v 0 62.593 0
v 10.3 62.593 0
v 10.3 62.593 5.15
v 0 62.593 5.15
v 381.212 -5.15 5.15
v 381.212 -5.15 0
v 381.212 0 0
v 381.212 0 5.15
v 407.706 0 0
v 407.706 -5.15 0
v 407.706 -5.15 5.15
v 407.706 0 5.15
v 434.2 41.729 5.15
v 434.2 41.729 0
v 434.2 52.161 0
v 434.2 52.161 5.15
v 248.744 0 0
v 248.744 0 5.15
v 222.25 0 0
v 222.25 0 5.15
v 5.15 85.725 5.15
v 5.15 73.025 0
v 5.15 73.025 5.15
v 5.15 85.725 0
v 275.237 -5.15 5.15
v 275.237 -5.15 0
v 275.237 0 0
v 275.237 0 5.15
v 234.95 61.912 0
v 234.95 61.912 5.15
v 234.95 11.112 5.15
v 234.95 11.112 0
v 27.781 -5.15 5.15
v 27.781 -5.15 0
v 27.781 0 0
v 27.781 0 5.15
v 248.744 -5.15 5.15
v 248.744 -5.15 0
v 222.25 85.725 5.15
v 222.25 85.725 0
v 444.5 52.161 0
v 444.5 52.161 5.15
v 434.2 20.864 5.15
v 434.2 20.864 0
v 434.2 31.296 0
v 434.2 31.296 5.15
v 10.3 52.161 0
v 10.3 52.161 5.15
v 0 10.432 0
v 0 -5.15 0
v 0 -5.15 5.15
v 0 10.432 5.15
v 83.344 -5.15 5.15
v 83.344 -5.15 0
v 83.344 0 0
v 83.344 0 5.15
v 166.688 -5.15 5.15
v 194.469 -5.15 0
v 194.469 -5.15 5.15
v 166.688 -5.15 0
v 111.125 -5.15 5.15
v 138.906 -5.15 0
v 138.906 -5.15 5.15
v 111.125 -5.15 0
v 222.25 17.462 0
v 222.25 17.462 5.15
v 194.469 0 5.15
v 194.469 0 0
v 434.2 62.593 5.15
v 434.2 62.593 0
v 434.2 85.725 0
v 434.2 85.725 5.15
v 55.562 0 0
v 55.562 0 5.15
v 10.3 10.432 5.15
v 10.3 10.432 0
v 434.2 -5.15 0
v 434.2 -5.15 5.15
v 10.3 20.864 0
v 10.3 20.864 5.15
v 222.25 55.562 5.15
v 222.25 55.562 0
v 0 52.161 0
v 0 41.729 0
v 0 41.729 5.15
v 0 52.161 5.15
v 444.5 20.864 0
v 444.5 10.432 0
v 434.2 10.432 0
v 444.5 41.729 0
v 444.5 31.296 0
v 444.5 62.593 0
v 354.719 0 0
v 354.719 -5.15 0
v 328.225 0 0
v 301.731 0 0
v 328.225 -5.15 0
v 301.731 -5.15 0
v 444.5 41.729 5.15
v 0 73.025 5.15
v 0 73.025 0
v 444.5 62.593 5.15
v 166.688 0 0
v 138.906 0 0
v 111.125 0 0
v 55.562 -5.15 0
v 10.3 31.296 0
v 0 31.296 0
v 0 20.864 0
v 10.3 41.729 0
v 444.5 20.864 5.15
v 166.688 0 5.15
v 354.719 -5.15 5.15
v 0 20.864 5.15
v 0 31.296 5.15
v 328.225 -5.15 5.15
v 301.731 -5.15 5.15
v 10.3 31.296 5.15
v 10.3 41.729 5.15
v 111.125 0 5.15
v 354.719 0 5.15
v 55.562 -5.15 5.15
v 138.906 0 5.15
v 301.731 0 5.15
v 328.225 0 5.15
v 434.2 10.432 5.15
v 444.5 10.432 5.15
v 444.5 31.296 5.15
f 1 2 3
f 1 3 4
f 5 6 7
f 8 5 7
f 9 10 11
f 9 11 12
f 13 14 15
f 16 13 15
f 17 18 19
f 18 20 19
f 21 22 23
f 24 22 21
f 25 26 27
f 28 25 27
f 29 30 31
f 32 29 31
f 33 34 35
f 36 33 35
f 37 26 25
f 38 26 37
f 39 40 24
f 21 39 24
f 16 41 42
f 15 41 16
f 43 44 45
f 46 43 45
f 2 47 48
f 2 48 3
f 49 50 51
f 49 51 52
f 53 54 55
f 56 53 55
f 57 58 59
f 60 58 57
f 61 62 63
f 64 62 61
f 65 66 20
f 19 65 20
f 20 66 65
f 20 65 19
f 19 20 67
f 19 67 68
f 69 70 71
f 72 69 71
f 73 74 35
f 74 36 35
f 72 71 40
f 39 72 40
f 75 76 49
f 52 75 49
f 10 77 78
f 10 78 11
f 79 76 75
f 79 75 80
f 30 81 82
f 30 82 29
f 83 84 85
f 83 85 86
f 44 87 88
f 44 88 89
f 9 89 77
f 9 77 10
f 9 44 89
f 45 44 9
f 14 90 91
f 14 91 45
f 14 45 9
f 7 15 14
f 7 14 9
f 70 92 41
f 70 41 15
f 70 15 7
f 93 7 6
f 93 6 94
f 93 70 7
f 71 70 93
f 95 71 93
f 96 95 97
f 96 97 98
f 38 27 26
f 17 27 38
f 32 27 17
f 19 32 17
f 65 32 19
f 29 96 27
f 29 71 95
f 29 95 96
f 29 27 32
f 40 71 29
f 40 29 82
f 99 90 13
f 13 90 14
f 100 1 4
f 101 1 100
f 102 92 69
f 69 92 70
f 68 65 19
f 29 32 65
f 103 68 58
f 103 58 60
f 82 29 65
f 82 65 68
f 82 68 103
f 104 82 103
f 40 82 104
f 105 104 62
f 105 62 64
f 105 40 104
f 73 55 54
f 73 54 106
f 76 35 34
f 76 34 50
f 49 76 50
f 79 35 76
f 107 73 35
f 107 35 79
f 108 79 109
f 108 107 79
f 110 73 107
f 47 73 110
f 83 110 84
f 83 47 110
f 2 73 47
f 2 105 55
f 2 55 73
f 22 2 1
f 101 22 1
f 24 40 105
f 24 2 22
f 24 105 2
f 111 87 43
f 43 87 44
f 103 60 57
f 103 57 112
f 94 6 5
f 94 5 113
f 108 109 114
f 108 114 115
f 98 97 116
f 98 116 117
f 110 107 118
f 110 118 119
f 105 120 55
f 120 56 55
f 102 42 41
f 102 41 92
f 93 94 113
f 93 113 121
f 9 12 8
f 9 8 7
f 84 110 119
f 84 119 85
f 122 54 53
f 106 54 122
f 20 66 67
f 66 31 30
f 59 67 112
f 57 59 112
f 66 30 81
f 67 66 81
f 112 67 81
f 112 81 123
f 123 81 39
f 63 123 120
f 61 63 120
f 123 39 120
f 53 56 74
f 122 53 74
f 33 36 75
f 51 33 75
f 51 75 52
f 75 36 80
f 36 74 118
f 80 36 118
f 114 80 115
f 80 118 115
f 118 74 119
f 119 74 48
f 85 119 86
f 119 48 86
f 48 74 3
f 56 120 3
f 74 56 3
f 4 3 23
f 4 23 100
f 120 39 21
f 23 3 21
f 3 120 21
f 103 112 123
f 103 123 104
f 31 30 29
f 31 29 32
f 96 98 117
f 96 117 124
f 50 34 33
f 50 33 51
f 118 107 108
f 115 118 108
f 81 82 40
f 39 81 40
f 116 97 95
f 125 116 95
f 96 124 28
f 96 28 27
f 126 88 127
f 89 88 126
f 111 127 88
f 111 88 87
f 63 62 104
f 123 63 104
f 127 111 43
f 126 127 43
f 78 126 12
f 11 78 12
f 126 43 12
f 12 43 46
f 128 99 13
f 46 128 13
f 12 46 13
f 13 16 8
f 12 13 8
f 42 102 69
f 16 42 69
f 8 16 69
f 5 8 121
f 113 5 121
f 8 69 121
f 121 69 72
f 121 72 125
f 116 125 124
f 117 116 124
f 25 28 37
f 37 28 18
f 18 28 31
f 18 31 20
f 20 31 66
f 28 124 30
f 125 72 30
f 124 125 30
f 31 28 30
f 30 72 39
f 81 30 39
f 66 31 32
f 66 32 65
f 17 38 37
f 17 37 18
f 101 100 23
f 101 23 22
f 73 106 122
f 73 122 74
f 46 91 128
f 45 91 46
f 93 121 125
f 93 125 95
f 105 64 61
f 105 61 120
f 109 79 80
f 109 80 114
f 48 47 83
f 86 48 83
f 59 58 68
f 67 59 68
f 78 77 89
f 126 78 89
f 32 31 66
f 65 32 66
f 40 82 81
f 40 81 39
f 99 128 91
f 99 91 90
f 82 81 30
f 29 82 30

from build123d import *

# Parameters (mm, degrees)
SKETCH1_W              = 444.5
SKETCH1_H              = 73.025
BOSS_EXTRUDE1_DEPTH    = 5.15
SKETCH3_W              = 3.175
SKETCH3_H              = 73.025
BOSS_EXTRUDE2_DEPTH    = 441.325
SKETCH4_W              = 3.175
SKETCH4_H              = 73.025
BOSS_EXTRUDE3_DEPTH    = 438.15
SPLIT2_SURFACE_1_BACK  = 635.234
SPLIT2_SURFACE_1_DEPTH = 1270.468
SPLIT2_SURFACE_2_BACK  = 635.234
SPLIT2_SURFACE_2_DEPTH = 1270.468
SKETCH8_W              = 441.325
SKETCH8_H              = 73.025
CUT_EXTRUDE2_DEPTH     = 631.619264097
SKETCH9_W              = 10.300000228
SKETCH9_H              = 10.432142857
SKETCH9_H_2            = 10.432142858
CUT_EXTRUDE3_DEPTH     = 451.48798333
SKETCH15_W             = 26.493749972
SKETCH15_H             = 5.15
BOSS_EXTRUDE6_DEPTH    = 5.15
SKETCH16_W             = 27.78125
SKETCH16_H             = 5.15
BOSS_EXTRUDE7_DEPTH    = 5.15
SKETCH17_W             = 211.949999772
SKETCH17_H             = 12.7
BOSS_EXTRUDE8_DEPTH    = 5.15
SKETCH18_W             = 217.099999886
SKETCH18_H             = 12.7
BOSS_EXTRUDE9_DEPTH    = 5.15


with BuildPart() as part:
    # Sketch1 → Boss-Extrude1 (new body)
    with BuildSketch(Plane.XY):
        with Locations((222.25, 36.5125)):
            Rectangle(SKETCH1_W, SKETCH1_H)
    extrude(amount=BOSS_EXTRUDE1_DEPTH)

    # Sketch3 → Boss-Extrude2 (add)
    with BuildSketch(Plane(origin=(0, 0, 0), x_dir=(-1, 0, 0), z_dir=(0, 0, -1))):
        with Locations((-442.9125, 36.5125)):
            Rectangle(SKETCH3_W, SKETCH3_H)
        with Locations((-1.5875, 36.5125)):
            Rectangle(SKETCH3_W, SKETCH3_H)
    extrude(amount=BOSS_EXTRUDE2_DEPTH)

    # Sketch4 → Boss-Extrude3 (add)
    with BuildSketch(Plane(origin=(3.175, 0, 0), x_dir=(0, 0, -1), z_dir=(1, 0, 0))):
        with Locations((439.7375, 36.5125)):
            Rectangle(SKETCH4_W, SKETCH4_H)
    extrude(amount=BOSS_EXTRUDE3_DEPTH)


with BuildPart() as body_2:
    # Split2: the piece behind the surface
    add(part.part)
    # Split2 surface: a surface, the sketch's curves swept straight by 1270.468 mm
    with BuildLine(Plane(origin=(0, 0, 5.15), x_dir=(-1, 0, 0), z_dir=(0, 0, -1)).offset(-SPLIT2_SURFACE_1_BACK), mode=Mode.PRIVATE) as split2_surface_1_path:
        Line((-222.25, 73.025), (-222.25, 55.5625))
        Line((-222.25, 55.5625), (-234.95, 61.9125))
        Line((-234.95, 61.9125), (-234.95, 11.1125))
        Line((-234.95, 11.1125), (-222.25, 17.4625))
        Line((-222.25, 17.4625), (-222.25, 0))
    split2_surface_1 = Shell.extrude(split2_surface_1_path.wire(), (0 * SPLIT2_SURFACE_1_DEPTH, 0 * SPLIT2_SURFACE_1_DEPTH, -1 * SPLIT2_SURFACE_1_DEPTH))
    split(bisect_by=split2_surface_1, keep=Keep.BOTTOM)


with BuildPart() as part_1:
    add(part.part)

    # Split2: split by a surface, the side it looks to stays
    # Split2 surface: a surface, the sketch's curves swept straight by 1270.468 mm
    with BuildLine(Plane(origin=(0, 0, 5.15), x_dir=(-1, 0, 0), z_dir=(0, 0, -1)).offset(-SPLIT2_SURFACE_2_BACK), mode=Mode.PRIVATE) as split2_surface_2_path:
        Line((-222.25, 73.025), (-222.25, 55.5625))
        Line((-222.25, 55.5625), (-234.95, 61.9125))
        Line((-234.95, 61.9125), (-234.95, 11.1125))
        Line((-234.95, 11.1125), (-222.25, 17.4625))
        Line((-222.25, 17.4625), (-222.25, 0))
    split2_surface_2 = Shell.extrude(split2_surface_2_path.wire(), (0 * SPLIT2_SURFACE_2_DEPTH, 0 * SPLIT2_SURFACE_2_DEPTH, -1 * SPLIT2_SURFACE_2_DEPTH))
    split(bisect_by=split2_surface_2, keep=Keep.TOP)


with BuildPart() as cut_extrude2_tool:
    # Sketch8 → Cut-Extrude2 (new, through all)
    with BuildSketch(Plane(origin=(444.5, 0, 0), x_dir=(0, 0, -1), z_dir=(1, 0, 0))):
        with Locations((220.6625, 36.5125)):
            Rectangle(SKETCH8_W, SKETCH8_H)
    extrude(amount=-CUT_EXTRUDE2_DEPTH)


with BuildPart() as part_2:
    add(part_1.part)

    # Cut-Extrude2: cut by cut_extrude2_tool
    add(cut_extrude2_tool.part, mode=Mode.SUBTRACT)


with BuildPart() as body_2_1:
    add(body_2.part)

    # Cut-Extrude2: cut by cut_extrude2_tool
    add(cut_extrude2_tool.part, mode=Mode.SUBTRACT)


with BuildPart() as cut_extrude3_tool:
    # Sketch9 → Cut-Extrude3 (new, through all)
    with BuildSketch(Plane(origin=(0, 0, 0), x_dir=(-1, 0, 0), z_dir=(0, 0, -1))):
        with Locations((-439.349999886, 67.808928572)):
            Rectangle(SKETCH9_W, SKETCH9_H)
        with Locations((-439.349999886, 46.944642857)):
            Rectangle(SKETCH9_W, SKETCH9_H)
        with Locations((-439.349999886, 26.080357143)):
            Rectangle(SKETCH9_W, SKETCH9_H)
        with Locations((-439.349999886, 5.216071429)):
            Rectangle(SKETCH9_W, SKETCH9_H)
        with Locations((-5.150000114, 57.376785715)):
            Rectangle(SKETCH9_W, SKETCH9_H)
        with Locations((-5.150000114, 36.5125)):
            Rectangle(SKETCH9_W, SKETCH9_H_2)
        with Locations((-5.150000114, 15.648214285)):
            Rectangle(SKETCH9_W, SKETCH9_H)
    extrude(amount=-CUT_EXTRUDE3_DEPTH)


with BuildPart() as part_3:
    add(part_2.part)

    # Cut-Extrude3: cut by cut_extrude3_tool
    add(cut_extrude3_tool.part, mode=Mode.SUBTRACT)

    # Sketch16 → Boss-Extrude7 (add)
    with BuildSketch(Plane(origin=(0, 0, 0), x_dir=(-1, 0, 0), z_dir=(0, 0, -1))):
        with Locations((-13.890625, -2.575)):
            Rectangle(SKETCH16_W, SKETCH16_H)
        with Locations((-69.453125, -2.575)):
            Rectangle(SKETCH16_W, SKETCH16_H)
        with Locations((-125.015625, -2.575)):
            Rectangle(SKETCH16_W, SKETCH16_H)
        with Locations((-180.578125, -2.575)):
            Rectangle(SKETCH16_W, SKETCH16_H)
    extrude(amount=-BOSS_EXTRUDE7_DEPTH)

    # Sketch18 → Boss-Extrude9 (add)
    with BuildSketch(Plane(origin=(0, 0, 0), x_dir=(-1, 0, 0), z_dir=(0, 0, -1))):
        with Locations((-113.700000057, 79.375)):
            Rectangle(SKETCH18_W, SKETCH18_H)
    extrude(amount=-BOSS_EXTRUDE9_DEPTH)


with BuildPart() as body_2_2:
    add(body_2_1.part)

    # Cut-Extrude3: cut by cut_extrude3_tool
    add(cut_extrude3_tool.part, mode=Mode.SUBTRACT)

    # Sketch15 → Boss-Extrude6 (add)
    with BuildSketch(Plane(origin=(0, 0, 0), x_dir=(-1, 0, 0), z_dir=(0, 0, -1))):
        with Locations((-420.953124786, -2.575)):
            Rectangle(SKETCH15_W, SKETCH15_H)
        with Locations((-367.965624843, -2.575)):
            Rectangle(SKETCH15_W, SKETCH15_H)
        with Locations((-314.9781249, -2.575)):
            Rectangle(SKETCH15_W, SKETCH15_H)
        with Locations((-261.990624957, -2.575)):
            Rectangle(SKETCH15_W, SKETCH15_H)
    extrude(amount=-BOSS_EXTRUDE6_DEPTH)

    # Sketch17 → Boss-Extrude8 (add)
    with BuildSketch(Plane(origin=(0, 0, 0), x_dir=(-1, 0, 0), z_dir=(0, 0, -1))):
        with Locations((-328.224999886, 79.375)):
            Rectangle(SKETCH17_W, SKETCH17_H)
    extrude(amount=-BOSS_EXTRUDE8_DEPTH)


solid = Compound([part_3.part, body_2_2.part])
